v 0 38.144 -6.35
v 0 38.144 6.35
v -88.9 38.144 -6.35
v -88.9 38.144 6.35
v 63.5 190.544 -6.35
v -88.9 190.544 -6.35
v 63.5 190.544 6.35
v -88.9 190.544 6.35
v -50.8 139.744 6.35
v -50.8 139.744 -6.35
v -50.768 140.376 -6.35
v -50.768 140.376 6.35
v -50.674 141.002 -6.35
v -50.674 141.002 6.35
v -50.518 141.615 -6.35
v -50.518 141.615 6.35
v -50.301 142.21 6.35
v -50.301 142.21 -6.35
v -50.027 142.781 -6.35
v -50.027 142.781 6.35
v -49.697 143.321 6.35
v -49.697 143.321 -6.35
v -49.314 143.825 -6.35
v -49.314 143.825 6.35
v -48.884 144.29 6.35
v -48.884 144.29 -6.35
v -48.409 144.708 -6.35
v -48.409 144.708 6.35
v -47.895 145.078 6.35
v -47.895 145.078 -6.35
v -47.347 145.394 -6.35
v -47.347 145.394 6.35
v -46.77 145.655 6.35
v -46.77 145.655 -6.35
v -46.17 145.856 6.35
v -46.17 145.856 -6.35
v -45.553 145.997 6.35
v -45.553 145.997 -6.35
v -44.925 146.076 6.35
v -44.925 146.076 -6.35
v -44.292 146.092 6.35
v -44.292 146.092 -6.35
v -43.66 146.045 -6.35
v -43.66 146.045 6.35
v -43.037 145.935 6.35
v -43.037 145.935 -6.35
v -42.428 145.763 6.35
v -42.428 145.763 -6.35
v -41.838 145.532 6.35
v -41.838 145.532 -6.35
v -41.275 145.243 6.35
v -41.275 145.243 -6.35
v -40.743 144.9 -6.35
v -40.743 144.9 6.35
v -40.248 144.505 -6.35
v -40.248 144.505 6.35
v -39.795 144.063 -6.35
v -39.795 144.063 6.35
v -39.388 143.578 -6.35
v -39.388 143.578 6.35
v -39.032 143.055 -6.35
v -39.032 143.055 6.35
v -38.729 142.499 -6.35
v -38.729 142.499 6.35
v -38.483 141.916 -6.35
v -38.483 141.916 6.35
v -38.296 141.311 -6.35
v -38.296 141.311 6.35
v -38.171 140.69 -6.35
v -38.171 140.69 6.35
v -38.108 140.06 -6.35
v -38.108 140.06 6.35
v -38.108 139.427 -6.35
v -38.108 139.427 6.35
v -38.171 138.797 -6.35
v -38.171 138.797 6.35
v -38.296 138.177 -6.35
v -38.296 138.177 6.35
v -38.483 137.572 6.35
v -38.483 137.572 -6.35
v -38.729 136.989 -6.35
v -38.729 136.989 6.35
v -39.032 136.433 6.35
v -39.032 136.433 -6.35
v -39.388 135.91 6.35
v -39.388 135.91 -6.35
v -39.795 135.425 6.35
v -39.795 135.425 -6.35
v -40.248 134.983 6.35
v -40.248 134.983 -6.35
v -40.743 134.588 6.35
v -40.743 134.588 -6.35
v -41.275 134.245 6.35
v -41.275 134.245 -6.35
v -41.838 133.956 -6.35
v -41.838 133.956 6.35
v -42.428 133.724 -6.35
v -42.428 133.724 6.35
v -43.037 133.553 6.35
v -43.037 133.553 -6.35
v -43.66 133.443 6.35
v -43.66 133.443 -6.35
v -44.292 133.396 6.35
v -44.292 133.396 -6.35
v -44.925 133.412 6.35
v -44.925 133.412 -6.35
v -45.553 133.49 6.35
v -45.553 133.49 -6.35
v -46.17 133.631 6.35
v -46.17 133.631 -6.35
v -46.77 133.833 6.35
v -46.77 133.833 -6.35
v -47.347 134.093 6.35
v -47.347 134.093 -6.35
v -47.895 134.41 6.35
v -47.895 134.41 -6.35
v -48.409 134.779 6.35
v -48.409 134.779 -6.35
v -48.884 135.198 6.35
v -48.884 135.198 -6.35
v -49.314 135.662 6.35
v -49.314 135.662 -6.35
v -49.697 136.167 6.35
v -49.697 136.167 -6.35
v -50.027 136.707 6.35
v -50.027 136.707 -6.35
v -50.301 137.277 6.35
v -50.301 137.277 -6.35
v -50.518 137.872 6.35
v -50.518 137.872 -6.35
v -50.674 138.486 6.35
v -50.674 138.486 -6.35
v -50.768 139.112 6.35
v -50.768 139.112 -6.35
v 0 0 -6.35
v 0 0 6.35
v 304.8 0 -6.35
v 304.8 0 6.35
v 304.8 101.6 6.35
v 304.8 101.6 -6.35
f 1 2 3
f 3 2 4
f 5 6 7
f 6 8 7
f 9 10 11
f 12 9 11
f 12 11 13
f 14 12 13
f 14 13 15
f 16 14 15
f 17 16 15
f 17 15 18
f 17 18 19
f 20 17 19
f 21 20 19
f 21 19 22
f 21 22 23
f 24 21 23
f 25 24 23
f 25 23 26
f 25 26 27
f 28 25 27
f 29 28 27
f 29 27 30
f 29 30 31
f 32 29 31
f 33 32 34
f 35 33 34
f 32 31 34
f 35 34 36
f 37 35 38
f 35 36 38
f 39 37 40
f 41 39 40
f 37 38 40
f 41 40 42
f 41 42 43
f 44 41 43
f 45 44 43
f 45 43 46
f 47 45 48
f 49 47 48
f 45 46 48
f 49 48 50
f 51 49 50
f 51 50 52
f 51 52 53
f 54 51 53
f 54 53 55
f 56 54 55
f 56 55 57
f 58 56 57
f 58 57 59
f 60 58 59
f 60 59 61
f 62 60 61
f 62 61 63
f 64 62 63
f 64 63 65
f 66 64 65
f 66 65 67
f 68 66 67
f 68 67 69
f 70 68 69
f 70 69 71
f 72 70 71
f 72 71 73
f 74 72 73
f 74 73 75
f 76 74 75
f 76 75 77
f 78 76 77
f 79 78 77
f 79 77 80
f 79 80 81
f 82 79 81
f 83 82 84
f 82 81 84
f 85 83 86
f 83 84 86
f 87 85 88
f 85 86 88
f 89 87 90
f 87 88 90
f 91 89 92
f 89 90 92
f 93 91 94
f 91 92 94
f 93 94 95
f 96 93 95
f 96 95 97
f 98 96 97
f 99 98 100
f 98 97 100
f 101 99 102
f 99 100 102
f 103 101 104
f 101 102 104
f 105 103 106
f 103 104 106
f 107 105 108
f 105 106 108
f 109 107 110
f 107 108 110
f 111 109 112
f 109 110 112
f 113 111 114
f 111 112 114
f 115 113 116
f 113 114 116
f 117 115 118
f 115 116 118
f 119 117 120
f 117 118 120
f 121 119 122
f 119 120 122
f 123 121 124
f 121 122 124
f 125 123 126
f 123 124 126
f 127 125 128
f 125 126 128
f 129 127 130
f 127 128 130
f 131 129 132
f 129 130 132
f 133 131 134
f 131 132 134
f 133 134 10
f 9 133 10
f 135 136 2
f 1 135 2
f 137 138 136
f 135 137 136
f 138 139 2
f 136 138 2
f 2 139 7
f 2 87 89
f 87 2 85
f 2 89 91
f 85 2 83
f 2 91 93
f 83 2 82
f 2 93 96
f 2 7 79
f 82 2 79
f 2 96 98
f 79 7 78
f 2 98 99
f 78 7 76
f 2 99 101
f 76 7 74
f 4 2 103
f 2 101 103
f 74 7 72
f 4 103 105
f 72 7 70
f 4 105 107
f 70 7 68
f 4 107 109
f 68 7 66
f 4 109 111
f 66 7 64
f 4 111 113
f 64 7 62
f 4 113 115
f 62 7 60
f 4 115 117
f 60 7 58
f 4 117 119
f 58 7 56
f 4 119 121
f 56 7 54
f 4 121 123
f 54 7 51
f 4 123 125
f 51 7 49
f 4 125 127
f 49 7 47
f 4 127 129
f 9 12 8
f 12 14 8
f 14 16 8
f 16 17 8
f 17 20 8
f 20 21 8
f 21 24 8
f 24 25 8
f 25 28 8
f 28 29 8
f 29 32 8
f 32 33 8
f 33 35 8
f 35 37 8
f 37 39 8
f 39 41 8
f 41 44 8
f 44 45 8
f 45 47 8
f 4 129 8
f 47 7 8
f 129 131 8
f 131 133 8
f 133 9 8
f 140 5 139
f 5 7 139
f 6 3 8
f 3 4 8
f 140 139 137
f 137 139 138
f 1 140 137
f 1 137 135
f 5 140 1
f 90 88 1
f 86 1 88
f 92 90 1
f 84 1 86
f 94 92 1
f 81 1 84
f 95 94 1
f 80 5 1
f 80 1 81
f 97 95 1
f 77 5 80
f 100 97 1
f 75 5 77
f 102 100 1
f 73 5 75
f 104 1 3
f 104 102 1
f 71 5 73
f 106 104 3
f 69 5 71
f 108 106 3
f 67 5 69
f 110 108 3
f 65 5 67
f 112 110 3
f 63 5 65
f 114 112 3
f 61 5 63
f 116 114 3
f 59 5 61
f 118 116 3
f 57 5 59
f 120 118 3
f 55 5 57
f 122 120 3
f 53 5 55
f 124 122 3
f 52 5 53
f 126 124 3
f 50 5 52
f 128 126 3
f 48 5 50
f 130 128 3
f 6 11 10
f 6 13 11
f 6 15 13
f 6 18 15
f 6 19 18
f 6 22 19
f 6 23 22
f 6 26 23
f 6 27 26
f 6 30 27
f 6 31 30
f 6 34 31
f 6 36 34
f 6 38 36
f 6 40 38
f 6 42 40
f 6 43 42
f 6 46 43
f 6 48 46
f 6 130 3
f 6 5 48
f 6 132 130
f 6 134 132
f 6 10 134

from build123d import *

# Parameters (mm, degrees)
BOSS_EXTRUDE1_DEPTH        = 6.35
F_1_2_0_5_DIAMETER_HOLE1_D = 12.7


with BuildPart() as part:
    # Sketch1 → Boss-Extrude1 (new, symmetric)
    with BuildSketch(Plane.XY):
        Polygon((0, 38.14379681), (-88.9, 38.14379681), (-88.9, 190.54379681), (63.5, 190.54379681), (304.8, 101.6), (304.8, 0), (0, 0), align=None)
    extrude(amount=BOSS_EXTRUDE1_DEPTH, both=True)

    # 1/2 (0.5) Diameter Hole1 (through all)
    with Locations(Plane(origin=(-44.45, 139.74379681, 6.35), x_dir=(1, 0, 0), z_dir=(0, 0, 1))):
        with Locations((0, 0)):
            Hole(F_1_2_0_5_DIAMETER_HOLE1_D / 2)


solid = part.part
